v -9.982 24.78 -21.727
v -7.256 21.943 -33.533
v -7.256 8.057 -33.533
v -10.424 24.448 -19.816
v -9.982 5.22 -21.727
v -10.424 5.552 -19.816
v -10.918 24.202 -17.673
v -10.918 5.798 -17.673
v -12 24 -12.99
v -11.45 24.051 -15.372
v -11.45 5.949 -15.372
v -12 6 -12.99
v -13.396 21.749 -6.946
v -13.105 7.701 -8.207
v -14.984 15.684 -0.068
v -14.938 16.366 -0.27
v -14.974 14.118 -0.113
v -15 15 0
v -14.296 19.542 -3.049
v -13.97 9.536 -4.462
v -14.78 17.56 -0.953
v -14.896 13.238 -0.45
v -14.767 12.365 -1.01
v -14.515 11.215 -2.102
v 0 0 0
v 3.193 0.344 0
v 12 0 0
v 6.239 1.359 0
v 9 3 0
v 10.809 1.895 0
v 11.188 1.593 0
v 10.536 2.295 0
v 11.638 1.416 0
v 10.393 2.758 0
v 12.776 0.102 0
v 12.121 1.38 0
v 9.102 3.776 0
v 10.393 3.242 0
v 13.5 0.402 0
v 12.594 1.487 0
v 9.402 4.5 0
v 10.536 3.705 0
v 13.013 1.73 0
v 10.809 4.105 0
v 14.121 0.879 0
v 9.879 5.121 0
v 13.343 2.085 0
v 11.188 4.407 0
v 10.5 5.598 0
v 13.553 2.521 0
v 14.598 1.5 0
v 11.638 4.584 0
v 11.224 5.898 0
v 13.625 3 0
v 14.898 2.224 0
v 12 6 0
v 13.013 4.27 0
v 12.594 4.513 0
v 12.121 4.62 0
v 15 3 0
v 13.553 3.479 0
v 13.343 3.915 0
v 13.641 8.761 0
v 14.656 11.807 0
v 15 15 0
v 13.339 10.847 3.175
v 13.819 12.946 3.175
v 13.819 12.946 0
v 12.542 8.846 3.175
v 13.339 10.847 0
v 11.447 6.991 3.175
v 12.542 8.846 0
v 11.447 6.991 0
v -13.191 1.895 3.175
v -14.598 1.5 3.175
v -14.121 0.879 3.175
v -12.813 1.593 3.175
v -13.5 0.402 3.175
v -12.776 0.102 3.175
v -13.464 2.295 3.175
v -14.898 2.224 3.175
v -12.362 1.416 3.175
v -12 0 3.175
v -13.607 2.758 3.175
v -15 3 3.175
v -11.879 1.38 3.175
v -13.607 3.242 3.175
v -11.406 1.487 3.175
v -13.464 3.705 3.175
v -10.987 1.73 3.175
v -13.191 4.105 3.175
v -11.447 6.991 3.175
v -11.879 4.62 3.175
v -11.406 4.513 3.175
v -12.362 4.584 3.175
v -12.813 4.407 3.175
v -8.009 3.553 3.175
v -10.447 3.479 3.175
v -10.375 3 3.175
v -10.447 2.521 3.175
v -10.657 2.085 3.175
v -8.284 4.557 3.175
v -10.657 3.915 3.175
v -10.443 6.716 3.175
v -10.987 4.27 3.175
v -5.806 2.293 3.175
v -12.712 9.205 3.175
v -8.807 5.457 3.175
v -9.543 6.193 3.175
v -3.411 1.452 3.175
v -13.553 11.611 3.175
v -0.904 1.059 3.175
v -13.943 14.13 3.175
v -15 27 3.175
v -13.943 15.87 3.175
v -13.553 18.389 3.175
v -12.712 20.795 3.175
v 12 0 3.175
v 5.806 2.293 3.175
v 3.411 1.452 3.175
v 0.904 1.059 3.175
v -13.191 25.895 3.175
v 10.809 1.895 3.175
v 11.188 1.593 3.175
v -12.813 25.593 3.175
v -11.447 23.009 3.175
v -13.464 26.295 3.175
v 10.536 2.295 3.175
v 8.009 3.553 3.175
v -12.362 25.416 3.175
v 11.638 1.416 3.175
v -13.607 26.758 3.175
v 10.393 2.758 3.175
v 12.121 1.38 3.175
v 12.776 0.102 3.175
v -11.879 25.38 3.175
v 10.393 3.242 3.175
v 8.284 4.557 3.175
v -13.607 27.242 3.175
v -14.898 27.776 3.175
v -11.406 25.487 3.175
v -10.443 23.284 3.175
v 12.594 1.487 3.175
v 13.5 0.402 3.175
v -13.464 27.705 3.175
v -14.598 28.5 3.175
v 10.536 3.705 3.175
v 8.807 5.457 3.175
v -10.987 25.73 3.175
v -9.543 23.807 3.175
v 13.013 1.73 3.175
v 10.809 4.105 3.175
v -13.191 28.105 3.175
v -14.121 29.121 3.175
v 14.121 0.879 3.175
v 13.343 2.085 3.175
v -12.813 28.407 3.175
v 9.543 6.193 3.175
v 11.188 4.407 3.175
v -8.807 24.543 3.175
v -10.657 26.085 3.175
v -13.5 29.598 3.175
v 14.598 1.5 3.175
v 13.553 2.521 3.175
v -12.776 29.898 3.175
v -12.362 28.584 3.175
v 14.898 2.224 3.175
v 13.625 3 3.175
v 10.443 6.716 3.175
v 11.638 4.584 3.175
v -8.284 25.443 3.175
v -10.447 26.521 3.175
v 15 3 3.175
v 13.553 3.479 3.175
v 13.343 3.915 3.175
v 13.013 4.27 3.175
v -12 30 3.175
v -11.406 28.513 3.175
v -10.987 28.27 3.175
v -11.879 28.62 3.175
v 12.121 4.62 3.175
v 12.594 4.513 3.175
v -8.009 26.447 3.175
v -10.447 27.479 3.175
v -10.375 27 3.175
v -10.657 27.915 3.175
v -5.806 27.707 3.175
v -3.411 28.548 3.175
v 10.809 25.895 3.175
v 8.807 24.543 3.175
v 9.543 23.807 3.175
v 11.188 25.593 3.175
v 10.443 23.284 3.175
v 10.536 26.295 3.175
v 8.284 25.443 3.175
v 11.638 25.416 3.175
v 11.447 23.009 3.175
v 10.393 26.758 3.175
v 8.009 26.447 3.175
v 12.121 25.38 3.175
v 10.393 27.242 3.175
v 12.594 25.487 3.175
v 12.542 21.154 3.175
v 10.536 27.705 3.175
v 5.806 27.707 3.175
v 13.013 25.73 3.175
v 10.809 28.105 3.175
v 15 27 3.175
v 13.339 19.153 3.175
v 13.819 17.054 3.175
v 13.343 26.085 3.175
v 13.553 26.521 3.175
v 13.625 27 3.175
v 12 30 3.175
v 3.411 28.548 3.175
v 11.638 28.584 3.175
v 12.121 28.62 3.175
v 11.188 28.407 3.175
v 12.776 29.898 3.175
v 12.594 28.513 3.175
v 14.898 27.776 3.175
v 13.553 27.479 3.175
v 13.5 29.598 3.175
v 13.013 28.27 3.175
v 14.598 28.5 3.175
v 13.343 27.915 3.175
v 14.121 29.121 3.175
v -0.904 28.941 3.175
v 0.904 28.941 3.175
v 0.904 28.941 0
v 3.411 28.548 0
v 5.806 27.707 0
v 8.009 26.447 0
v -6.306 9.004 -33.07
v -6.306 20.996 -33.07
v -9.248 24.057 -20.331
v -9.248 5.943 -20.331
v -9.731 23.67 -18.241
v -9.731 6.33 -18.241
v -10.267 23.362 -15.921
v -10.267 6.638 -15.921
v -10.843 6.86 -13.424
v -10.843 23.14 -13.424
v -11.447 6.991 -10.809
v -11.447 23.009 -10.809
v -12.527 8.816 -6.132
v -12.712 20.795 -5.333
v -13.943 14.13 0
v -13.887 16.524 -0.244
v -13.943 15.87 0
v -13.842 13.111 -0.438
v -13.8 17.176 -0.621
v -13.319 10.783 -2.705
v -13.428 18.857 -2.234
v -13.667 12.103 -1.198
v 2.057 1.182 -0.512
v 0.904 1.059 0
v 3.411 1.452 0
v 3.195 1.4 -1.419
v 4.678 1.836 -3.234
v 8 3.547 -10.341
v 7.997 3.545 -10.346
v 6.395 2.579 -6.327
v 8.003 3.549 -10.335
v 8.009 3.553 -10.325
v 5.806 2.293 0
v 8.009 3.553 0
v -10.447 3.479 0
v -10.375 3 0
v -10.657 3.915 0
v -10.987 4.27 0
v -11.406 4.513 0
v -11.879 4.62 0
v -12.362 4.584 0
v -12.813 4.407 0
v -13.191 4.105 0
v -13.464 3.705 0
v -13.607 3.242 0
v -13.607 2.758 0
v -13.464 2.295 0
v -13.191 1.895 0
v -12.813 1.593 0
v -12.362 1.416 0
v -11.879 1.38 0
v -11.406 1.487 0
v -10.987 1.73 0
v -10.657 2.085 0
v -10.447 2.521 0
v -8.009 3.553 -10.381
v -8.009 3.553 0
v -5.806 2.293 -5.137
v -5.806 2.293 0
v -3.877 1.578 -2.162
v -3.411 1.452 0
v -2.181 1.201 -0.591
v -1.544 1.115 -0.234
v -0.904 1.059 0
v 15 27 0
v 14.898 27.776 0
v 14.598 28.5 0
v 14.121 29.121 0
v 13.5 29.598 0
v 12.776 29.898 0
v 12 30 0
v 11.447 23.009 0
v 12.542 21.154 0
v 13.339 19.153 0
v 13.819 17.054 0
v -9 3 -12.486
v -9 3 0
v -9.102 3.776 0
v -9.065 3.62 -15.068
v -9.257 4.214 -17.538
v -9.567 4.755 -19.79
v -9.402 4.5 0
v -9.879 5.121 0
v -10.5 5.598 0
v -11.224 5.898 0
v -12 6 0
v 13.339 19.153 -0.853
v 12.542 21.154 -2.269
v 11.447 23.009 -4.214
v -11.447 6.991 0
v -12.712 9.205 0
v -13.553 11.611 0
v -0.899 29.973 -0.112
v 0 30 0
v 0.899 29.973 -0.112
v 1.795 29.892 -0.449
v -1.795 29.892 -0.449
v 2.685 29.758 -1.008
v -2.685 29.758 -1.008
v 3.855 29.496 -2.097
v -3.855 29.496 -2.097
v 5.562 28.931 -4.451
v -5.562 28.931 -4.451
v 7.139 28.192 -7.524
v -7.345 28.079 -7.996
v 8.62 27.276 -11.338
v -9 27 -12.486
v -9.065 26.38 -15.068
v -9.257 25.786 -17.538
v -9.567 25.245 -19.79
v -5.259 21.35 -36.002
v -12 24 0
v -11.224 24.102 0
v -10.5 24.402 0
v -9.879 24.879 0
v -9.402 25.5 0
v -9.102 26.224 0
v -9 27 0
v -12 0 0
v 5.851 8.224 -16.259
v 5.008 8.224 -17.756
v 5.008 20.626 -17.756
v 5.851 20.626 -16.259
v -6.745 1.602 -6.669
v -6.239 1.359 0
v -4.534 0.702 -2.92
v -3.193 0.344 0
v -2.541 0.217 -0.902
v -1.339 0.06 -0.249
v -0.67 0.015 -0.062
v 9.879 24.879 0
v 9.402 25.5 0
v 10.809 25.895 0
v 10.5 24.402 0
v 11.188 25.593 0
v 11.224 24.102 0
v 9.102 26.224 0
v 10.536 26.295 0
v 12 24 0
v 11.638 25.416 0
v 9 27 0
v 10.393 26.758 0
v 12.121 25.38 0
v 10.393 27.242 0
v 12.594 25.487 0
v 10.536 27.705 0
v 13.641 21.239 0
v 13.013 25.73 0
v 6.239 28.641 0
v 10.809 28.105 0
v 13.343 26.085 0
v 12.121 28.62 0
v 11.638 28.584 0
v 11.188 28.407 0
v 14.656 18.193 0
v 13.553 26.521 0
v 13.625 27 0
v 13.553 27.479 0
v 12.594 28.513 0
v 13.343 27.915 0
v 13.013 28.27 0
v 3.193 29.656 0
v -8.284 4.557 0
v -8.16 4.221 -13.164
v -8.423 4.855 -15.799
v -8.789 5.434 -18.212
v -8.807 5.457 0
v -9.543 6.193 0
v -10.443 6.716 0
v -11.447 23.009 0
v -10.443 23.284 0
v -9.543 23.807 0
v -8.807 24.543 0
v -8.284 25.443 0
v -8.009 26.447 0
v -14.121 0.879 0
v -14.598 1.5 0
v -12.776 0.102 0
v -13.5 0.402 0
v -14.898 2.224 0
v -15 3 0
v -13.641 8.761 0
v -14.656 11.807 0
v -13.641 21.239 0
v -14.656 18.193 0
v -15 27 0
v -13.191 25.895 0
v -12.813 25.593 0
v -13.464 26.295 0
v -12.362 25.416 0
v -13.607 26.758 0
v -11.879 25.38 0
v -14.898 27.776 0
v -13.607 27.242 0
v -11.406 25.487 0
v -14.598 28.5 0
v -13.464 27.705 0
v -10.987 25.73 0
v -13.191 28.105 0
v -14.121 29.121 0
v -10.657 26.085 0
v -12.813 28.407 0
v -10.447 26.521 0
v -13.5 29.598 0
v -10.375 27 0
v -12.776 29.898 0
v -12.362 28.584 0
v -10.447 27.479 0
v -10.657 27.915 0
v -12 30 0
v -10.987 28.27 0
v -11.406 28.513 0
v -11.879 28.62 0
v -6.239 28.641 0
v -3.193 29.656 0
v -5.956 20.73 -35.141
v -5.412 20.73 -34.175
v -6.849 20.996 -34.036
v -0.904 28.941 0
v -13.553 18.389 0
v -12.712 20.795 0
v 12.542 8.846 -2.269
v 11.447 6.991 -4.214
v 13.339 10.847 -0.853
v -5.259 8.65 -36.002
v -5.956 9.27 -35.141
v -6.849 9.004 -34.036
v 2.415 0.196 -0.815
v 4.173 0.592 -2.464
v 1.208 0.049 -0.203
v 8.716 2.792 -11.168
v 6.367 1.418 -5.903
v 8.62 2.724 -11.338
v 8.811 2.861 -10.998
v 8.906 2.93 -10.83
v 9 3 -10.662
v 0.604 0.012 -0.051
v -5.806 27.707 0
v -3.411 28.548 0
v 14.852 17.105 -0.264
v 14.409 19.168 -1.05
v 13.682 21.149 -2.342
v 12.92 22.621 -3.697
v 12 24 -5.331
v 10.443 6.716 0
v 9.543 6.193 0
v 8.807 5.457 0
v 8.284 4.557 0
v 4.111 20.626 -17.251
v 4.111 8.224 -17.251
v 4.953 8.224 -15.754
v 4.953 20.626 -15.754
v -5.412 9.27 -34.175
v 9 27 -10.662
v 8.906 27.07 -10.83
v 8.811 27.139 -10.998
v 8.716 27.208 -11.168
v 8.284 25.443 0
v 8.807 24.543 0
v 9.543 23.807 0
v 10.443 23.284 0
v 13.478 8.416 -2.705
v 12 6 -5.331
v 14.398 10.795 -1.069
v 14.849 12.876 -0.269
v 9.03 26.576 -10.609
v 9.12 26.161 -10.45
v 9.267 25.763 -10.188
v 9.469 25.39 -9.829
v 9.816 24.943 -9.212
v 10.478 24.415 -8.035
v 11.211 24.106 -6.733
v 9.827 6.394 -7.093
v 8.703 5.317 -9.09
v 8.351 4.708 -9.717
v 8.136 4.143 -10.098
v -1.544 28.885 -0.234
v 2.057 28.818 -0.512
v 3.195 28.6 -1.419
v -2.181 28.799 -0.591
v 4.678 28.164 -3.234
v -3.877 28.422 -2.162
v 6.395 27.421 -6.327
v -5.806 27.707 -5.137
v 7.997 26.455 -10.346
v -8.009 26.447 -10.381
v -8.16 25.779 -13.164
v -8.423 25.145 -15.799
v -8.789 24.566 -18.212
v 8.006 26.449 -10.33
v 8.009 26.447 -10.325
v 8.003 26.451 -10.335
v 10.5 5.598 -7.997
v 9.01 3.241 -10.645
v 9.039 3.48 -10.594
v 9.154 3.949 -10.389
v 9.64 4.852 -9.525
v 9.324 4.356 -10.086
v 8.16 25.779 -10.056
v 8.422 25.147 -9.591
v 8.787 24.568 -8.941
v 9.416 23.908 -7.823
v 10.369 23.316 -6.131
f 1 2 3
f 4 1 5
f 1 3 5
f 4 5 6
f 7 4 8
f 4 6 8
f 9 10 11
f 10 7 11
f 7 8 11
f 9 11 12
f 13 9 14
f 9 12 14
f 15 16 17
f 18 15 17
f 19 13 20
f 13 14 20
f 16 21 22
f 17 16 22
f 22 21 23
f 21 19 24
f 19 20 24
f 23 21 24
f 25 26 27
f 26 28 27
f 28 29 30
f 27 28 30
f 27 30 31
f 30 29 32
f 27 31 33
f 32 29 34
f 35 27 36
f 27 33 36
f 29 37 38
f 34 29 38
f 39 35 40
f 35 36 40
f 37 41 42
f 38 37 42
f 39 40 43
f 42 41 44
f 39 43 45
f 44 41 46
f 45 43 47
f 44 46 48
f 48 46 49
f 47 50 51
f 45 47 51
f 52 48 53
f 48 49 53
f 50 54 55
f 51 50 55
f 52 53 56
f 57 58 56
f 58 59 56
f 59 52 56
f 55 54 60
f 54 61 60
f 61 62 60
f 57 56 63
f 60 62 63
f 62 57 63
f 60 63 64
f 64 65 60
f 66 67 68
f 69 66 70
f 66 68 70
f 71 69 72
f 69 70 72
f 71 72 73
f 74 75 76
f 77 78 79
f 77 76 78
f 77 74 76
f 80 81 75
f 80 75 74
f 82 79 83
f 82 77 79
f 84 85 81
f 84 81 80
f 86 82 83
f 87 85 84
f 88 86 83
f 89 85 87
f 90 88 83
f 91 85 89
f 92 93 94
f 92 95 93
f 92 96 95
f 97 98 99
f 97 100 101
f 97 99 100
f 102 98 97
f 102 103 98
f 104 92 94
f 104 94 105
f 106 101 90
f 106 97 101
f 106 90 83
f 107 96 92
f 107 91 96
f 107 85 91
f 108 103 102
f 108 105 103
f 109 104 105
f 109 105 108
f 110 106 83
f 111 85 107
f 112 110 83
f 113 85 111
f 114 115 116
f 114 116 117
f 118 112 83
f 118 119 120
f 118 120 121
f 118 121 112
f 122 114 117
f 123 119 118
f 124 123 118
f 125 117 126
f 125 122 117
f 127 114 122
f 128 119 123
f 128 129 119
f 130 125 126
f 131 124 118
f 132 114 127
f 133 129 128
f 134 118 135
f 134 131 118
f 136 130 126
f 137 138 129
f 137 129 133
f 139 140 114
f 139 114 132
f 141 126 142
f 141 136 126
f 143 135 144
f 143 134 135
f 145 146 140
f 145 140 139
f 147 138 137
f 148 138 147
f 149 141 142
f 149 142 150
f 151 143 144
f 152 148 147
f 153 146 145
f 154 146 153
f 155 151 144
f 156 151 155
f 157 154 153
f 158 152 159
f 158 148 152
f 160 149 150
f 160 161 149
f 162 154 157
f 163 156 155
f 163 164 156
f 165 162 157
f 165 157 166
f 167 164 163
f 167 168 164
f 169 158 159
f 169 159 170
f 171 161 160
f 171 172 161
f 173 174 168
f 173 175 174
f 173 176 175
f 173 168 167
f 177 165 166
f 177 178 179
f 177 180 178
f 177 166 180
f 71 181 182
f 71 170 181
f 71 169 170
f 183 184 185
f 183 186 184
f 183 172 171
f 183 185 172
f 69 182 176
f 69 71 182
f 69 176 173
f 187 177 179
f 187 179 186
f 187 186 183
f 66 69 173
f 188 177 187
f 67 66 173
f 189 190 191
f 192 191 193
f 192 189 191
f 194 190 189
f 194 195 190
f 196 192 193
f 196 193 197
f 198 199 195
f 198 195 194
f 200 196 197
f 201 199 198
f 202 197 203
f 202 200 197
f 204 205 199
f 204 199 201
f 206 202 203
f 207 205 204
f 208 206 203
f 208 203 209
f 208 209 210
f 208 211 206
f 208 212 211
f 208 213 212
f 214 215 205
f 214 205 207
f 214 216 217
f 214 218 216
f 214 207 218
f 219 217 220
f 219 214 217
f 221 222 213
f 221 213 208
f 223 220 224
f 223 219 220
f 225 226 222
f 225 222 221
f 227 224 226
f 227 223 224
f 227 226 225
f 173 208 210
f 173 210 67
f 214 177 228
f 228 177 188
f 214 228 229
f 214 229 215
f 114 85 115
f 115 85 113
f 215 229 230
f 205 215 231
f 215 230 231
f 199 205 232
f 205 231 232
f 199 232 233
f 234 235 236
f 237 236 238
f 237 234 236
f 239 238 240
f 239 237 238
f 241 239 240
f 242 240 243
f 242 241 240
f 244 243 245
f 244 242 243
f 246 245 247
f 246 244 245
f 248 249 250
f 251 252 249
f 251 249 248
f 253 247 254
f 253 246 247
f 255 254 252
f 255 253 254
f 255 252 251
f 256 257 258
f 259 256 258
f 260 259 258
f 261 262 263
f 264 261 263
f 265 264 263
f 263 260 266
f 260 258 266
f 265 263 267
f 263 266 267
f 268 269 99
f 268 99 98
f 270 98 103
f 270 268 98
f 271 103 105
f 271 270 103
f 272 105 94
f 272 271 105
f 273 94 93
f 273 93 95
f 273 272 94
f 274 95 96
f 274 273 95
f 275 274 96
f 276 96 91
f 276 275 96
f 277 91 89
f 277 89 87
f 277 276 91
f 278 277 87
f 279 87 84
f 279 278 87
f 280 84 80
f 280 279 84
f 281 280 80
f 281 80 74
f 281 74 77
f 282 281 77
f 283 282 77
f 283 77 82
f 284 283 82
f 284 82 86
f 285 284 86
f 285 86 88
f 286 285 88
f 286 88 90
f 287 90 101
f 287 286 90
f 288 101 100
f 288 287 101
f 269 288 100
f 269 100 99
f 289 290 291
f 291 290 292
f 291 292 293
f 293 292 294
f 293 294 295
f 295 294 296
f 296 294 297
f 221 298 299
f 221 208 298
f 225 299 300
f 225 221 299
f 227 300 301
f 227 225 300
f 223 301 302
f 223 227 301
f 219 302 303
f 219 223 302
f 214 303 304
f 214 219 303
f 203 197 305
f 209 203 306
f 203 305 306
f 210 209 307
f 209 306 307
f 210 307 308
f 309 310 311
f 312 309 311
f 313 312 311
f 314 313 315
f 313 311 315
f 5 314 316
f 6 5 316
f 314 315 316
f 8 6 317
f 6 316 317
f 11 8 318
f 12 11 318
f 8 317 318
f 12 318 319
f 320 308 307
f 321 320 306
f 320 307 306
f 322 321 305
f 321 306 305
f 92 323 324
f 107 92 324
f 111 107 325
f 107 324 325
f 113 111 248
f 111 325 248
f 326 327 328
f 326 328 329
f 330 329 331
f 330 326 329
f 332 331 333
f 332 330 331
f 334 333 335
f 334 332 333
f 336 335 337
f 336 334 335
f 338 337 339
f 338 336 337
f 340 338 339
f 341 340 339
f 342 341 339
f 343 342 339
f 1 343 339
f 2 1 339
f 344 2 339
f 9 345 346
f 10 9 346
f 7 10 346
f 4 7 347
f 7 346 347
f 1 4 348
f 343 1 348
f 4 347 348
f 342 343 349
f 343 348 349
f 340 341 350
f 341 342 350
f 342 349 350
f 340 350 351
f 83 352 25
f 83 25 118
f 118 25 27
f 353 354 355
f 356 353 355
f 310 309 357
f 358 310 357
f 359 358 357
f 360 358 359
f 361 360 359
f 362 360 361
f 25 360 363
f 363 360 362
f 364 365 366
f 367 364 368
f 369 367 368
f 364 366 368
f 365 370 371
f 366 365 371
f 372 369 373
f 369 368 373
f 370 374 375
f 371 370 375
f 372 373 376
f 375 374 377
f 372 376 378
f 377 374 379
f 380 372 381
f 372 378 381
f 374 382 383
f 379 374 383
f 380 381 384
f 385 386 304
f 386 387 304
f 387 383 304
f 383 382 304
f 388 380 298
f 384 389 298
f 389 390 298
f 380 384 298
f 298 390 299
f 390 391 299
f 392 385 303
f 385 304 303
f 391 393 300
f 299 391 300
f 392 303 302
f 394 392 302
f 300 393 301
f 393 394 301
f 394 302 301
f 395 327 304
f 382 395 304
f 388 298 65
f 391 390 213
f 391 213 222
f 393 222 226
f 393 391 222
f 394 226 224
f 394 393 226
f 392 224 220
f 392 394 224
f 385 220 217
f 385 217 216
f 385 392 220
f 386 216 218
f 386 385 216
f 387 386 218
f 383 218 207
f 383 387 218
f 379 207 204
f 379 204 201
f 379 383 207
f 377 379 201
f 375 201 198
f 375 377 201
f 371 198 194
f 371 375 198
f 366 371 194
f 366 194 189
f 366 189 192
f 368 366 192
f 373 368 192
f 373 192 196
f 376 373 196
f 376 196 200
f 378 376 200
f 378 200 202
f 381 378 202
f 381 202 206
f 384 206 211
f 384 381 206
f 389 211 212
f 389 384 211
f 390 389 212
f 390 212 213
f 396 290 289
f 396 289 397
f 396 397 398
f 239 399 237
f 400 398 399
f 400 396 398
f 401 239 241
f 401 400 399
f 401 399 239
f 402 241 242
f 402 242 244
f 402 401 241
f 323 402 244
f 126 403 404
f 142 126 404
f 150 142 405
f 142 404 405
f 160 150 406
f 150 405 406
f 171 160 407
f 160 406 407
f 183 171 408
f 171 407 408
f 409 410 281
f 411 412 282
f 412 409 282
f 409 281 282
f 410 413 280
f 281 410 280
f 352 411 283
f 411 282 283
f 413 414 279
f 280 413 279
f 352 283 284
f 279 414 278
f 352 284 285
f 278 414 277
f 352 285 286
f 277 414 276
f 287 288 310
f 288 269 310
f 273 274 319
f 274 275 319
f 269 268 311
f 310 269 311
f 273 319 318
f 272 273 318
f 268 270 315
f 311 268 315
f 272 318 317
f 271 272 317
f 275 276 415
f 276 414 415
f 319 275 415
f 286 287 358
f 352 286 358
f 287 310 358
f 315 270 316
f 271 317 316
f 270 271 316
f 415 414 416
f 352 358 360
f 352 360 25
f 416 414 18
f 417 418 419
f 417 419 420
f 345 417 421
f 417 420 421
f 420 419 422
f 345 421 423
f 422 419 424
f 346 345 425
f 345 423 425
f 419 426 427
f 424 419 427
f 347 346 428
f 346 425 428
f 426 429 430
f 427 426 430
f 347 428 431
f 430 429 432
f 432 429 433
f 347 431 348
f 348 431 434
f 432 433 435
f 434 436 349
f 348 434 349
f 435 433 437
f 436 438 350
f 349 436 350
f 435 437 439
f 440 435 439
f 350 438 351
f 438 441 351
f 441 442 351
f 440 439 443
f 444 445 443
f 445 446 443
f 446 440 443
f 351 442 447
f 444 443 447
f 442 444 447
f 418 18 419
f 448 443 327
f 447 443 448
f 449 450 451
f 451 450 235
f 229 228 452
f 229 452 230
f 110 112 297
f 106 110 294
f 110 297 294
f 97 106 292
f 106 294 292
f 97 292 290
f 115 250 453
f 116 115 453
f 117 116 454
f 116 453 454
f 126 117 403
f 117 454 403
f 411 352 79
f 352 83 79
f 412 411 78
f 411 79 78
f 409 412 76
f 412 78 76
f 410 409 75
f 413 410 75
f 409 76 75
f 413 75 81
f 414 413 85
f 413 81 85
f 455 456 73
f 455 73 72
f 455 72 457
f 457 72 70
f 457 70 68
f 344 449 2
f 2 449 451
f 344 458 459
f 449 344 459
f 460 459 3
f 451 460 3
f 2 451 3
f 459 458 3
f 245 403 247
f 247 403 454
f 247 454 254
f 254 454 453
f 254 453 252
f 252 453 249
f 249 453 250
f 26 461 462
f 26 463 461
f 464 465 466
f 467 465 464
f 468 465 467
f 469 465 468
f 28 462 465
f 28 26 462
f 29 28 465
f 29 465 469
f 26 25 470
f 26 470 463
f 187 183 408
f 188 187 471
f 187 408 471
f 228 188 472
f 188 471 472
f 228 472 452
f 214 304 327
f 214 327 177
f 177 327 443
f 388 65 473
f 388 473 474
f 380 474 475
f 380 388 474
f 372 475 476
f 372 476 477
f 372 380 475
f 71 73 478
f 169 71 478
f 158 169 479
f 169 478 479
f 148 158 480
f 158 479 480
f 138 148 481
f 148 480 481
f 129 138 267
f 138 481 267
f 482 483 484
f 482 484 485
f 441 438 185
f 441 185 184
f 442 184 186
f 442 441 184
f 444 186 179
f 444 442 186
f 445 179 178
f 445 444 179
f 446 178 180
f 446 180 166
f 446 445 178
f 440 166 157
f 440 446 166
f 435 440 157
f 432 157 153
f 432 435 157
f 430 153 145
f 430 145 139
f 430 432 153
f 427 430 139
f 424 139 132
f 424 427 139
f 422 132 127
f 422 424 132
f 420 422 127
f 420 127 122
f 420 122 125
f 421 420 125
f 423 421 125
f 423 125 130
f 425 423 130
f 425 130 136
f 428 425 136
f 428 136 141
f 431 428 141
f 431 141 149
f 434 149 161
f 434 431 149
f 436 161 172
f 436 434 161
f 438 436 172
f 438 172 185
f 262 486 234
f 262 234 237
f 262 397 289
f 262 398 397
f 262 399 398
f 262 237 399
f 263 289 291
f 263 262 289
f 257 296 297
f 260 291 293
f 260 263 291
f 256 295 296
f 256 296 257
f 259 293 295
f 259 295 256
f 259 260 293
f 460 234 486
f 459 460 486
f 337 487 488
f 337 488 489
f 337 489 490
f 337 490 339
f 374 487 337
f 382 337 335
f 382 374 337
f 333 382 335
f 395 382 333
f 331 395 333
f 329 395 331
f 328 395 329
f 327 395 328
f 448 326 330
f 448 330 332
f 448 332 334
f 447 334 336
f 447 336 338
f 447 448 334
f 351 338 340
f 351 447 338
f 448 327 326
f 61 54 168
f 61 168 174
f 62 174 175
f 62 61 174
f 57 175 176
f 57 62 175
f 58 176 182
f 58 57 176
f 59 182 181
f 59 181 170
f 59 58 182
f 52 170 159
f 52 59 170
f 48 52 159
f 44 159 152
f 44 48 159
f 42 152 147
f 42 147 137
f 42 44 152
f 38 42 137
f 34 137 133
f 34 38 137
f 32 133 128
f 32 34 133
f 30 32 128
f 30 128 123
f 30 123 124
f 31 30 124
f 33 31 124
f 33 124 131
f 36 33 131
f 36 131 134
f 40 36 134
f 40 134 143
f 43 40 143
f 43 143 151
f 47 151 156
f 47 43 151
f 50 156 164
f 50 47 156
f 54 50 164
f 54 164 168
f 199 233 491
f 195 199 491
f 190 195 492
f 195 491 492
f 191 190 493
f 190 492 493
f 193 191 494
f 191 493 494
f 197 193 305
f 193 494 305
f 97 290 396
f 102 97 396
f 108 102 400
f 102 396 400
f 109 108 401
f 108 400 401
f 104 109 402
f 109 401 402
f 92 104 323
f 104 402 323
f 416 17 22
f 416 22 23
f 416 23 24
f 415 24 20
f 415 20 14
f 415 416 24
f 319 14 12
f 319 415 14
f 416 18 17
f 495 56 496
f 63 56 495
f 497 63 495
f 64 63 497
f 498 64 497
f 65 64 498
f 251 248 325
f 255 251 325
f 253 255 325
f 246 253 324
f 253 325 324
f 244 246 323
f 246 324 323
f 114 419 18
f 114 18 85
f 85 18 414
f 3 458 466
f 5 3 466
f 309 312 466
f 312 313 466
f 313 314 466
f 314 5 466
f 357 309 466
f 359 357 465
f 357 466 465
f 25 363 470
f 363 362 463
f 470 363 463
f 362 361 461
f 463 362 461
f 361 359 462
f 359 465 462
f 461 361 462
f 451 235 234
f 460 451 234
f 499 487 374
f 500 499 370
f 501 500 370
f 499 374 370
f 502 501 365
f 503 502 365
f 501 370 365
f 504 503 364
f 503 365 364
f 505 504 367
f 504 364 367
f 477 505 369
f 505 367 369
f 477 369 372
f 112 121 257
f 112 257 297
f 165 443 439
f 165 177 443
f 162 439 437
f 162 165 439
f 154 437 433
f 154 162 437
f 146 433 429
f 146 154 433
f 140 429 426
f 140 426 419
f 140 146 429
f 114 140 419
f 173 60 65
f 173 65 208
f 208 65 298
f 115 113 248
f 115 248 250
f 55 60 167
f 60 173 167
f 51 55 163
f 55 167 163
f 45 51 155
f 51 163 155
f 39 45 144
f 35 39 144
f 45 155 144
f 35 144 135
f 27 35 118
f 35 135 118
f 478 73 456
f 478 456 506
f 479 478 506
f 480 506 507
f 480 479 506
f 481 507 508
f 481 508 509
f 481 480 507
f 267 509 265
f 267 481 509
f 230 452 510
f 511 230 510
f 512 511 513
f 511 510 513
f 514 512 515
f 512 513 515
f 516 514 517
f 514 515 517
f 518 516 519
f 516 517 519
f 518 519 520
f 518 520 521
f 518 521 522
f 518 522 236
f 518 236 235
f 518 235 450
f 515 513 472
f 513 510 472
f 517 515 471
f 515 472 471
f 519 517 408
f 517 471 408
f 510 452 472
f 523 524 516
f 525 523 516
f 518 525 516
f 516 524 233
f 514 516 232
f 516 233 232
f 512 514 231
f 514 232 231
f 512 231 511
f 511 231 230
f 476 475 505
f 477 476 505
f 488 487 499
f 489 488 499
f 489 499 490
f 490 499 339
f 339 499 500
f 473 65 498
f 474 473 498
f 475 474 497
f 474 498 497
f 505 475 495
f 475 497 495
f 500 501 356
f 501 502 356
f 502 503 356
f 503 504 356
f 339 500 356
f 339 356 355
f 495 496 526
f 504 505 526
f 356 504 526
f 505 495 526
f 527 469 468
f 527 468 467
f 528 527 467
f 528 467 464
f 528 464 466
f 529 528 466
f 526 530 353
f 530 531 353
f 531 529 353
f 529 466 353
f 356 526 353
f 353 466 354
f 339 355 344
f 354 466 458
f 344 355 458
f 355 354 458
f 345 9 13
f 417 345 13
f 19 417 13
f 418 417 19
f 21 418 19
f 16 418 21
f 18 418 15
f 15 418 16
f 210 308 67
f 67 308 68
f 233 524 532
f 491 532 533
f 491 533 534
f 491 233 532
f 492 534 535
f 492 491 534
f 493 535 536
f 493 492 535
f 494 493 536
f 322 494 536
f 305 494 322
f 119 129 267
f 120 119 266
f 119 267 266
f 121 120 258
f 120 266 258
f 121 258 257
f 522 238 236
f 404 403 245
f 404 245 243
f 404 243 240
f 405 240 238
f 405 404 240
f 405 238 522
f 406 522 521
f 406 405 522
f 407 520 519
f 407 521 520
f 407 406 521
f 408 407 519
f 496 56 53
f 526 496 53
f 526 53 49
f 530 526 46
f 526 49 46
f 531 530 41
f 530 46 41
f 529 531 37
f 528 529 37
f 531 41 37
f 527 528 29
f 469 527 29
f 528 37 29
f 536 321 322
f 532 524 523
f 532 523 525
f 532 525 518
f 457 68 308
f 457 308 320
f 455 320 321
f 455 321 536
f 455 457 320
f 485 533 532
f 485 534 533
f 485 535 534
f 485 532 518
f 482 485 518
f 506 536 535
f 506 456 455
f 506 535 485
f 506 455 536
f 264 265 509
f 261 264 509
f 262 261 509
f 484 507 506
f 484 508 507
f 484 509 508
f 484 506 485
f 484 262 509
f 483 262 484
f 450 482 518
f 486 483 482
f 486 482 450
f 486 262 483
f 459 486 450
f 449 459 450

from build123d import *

# Parameters (mm, degrees)
F0_R          = 15
F1_DEPTH      = 50.8
F3_DEPTH      = 50.8
F5_DEPTH      = 16
F5_DEPTH_BACK = 25.4
F6_R          = 2.999994
F7_DEPTH      = 75
F8_T          = -1.0294366
F9_R          = 1.625
F10_DEPTH     = 3.175
F11_R         = 2.999994
F12_W         = 12.402147986
F12_H         = 1.7178952694
F13_DEPTH     = 1.0294366
F15_REACH     = 37.7778044783
F16_DEPTH     = 1.7178952694


# Not quite as in the source:
# - an extrude ends at something that could not be found from the text; its depth is read off the source's solid


with BuildPart() as f1:
    # F0 (on Top) → F1 (new body)
    with BuildSketch(Plane.XY):
        with Locations((0, 15)):
            Circle(F0_R)
    extrude(amount=-F1_DEPTH)

    # F2 (on Front) → F3 (cut)
    with BuildSketch(Plane.XZ):
        Polygon((-15, 0), (-15, -50.8), (15, -50.8), (15, 0), (-5.2591228073, -36.0019072397), (-7.2556595325, -33.5332099912), align=None)
    extrude(amount=-F3_DEPTH, mode=Mode.SUBTRACT)

    # F4 (on Right) → F5 (cut, two sides)
    with BuildSketch(Plane.YZ) as f5_sk:
        Polygon((30, -36.0019072397), (30, 0), (21.35, -36.0019072397), align=None)
        Polygon((8.65, -36.0019072397), (0, 0), (0, -36.0019072397), align=None)
    extrude(amount=-F5_DEPTH, mode=Mode.SUBTRACT)
    extrude(f5_sk.sketch, amount=F5_DEPTH_BACK, mode=Mode.SUBTRACT)

    # F6 (on face) → F7 (cut, through all)
    with BuildSketch(Plane.XY):
        with Locations((12.000006, 27.000006)):
            Circle(F6_R)
        with Locations((12.000006, 2.999994)):
            Circle(F6_R)
        with Locations((-12.000006, 2.999994)):
            Circle(F6_R)
        with Locations((-12.000006, 27.000006)):
            Circle(F6_R)
    extrude(amount=-F7_DEPTH, mode=Mode.SUBTRACT)

    # F8
    f8_openings = [f1.faces().sort_by_distance(p)[0] for p in [
        (0, 15, 0),
    ]]
    offset(amount=F8_T, openings=f8_openings)

    # F9 (on face) → F10 (join)
    with BuildSketch(Plane.XY):
        with BuildLine():
            Line((1.23e-08, 0), (15, 0))
            Line((15, 0), (15, 15))
            ThreePointArc((15, 15), (14.230247099, 10.2565763946), (11.999991, 5.999988))
            ThreePointArc((11.999991, 5.999988), (9.8786898991, 5.1213101009), (9.000012, 3.000009))
            ThreePointArc((9.000012, 3.000009), (4.7434236112, 0.7697529029), (1.23e-08, 0))
        make_face()
        with Locations((12.000006, 2.999994)):
            Circle(F9_R, mode=Mode.SUBTRACT)
        with BuildLine():
            Line((-15, 0), (1.23e-08, 0))
            ThreePointArc((1.23e-08, 0), (-4.7434235996, 0.769752899), (-9.000012, 3.000009))
            ThreePointArc((-9.000012, 3.000009), (-9.8786898991, 5.1213101009), (-11.999991, 5.999988))
            ThreePointArc((-11.999991, 5.999988), (-14.230247099, 10.2565763946), (-15, 15))
            Line((-15, 15), (-15, 0))
        make_face()
        with Locations((-12.000006, 2.999994)):
            Circle(F9_R, mode=Mode.SUBTRACT)
        with BuildLine():
            ThreePointArc((-9.000012, 3.000009), (-4.7434235996, 0.769752899), (1.23e-08, 0))
            ThreePointArc((1.23e-08, 0), (4.7434236112, 0.7697529029), (9.000012, 3.000009))
            ThreePointArc((9.000012, 3.000009), (9.8786898991, 5.1213101009), (11.999991, 5.999988))
            ThreePointArc((11.999991, 5.999988), (14.230247099, 10.2565763946), (15, 15))
            ThreePointArc((15, 15), (14.230247099, 19.7434236054), (11.999991, 24.000012))
            ThreePointArc((11.999991, 24.000012), (9.8786898991, 24.8786898991), (9.000012, 26.999991))
            ThreePointArc((9.000012, 26.999991), (4.7434236018, 29.2302471002), (-7.6e-09, 30))
            ThreePointArc((-7.6e-09, 30), (-4.743423609, 29.2302470978), (-9.000012, 26.999991))
            ThreePointArc((-9.000012, 26.999991), (-9.8786898991, 24.8786898991), (-11.999991, 24.000012))
            ThreePointArc((-11.999991, 24.000012), (-14.230247099, 19.7434236054), (-15, 15))
            ThreePointArc((-15, 15), (-14.230247099, 10.2565763946), (-11.999991, 5.999988))
            ThreePointArc((-11.999991, 5.999988), (-9.8786898991, 5.1213101009), (-9.000012, 3.000009))
        make_face()
        with BuildLine():
            Line((0.9042769799, 1.0587330254), (-0.9042769799, 1.0587330254))
            ThreePointArc((-0.9042769799, 1.0587330254), (-4.6276702262, 1.8181446681), (-8.0086800871, 3.5528307003))
            ThreePointArc((-8.0086800871, 3.5528307003), (-9.1507682984, 5.8492317016), (-11.4471692997, 6.9913199129))
            ThreePointArc((-11.4471692997, 6.9913199129), (-13.1875845683, 10.3886818623), (-13.9434671073, 14.1303065241))
            Line((-13.9434671073, 14.1303065241), (-13.9434671073, 15.8696934759))
            ThreePointArc((-13.9434671073, 15.8696934759), (-13.1875845683, 19.6113181377), (-11.4471692997, 23.0086800871))
            ThreePointArc((-11.4471692997, 23.0086800871), (-9.1507682984, 24.1507682984), (-8.0086800871, 26.4471692997))
            ThreePointArc((-8.0086800871, 26.4471692997), (-4.6276702262, 28.1818553319), (-0.9042769799, 28.9412669746))
            Line((-0.9042769799, 28.9412669746), (0.9042769799, 28.9412669746))
            ThreePointArc((0.9042769799, 28.9412669746), (4.6276702262, 28.1818553319), (8.0086800871, 26.4471692997))
            ThreePointArc((8.0086800871, 26.4471692997), (9.1507682984, 24.1507682984), (11.4471692997, 23.0086800871))
            ThreePointArc((11.4471692997, 23.0086800871), (12.9790918545, 20.1691214289), (13.8187656408, 17.053864133))
            Line((13.8187656408, 17.053864133), (13.8187656408, 12.946135867))
            ThreePointArc((13.8187656408, 12.946135867), (12.9790918545, 9.8308785711), (11.4471692997, 6.9913199129))
            ThreePointArc((11.4471692997, 6.9913199129), (9.1507682984, 5.8492317016), (8.0086800871, 3.5528307003))
            ThreePointArc((8.0086800871, 3.5528307003), (4.6276702262, 1.8181446681), (0.9042769799, 1.0587330254))
        make_face(mode=Mode.SUBTRACT)
        with BuildLine():
            ThreePointArc((11.999991, 24.000012), (14.230247099, 19.7434236054), (15, 15))
            Line((15, 15), (15, 30))
            Line((15, 30), (-7.6e-09, 30))
            ThreePointArc((-7.6e-09, 30), (4.7434236018, 29.2302471002), (9.000012, 26.999991))
            ThreePointArc((9.000012, 26.999991), (9.8786898991, 24.8786898991), (11.999991, 24.000012))
        make_face()
        with Locations((12.000006, 27.000006)):
            Circle(F9_R, mode=Mode.SUBTRACT)
        with BuildLine():
            Line((-15, 30), (-15, 15))
            ThreePointArc((-15, 15), (-14.230247099, 19.7434236054), (-11.999991, 24.000012))
            ThreePointArc((-11.999991, 24.000012), (-9.8786898991, 24.8786898991), (-9.000012, 26.999991))
            ThreePointArc((-9.000012, 26.999991), (-4.743423609, 29.2302470978), (-7.6e-09, 30))
            Line((-7.6e-09, 30), (-15, 30))
        make_face()
        with Locations((-12.000006, 27.000006)):
            Circle(F9_R, mode=Mode.SUBTRACT)
    extrude(amount=F10_DEPTH)

    # F11
    f11_edges = [f1.edges().sort_by_distance(p)[0] for p in [
        (15, 0, 1.5875),
        (-15, 0, 1.5875),
        (-15, 30, 1.5875),
        (15, 30, 1.5875),
    ]]
    fillet(f11_edges, radius=F11_R)

    # F12 (on face) → F13 (cut, through all)
    with BuildSketch(Plane(origin=(11.3924813609, 0, -6.4108181112), x_dir=(0, 1, 0), z_dir=(0.8714922589, 0, -0.4904092603))):
        with Locations((14.4248786382, -12.1594956145)):
            Rectangle(F12_W, F12_H)
    extrude(amount=-F13_DEPTH, mode=Mode.SUBTRACT)

    f15_end = f1.faces().sort_by_distance((-6.2722387902, 15, -34.7491996848))[0]
    # F14 (on face) → F15 (cut, up to a face of the model that its end follows)
    with BuildSketch(Plane(origin=(-6.3843651243, 0, -11.3454725151), x_dir=(0.8714922589, 0, -0.4904092603), z_dir=(0.4904092603, 0, 0.8714922589))):
        Polygon((12.0429472841, 9.2698510415), (12.0429472841, 20.7301489585), (10.7223677877, 20.9956137981), (10.7223677877, 9.0043862019), align=None)
    f15_long = extrude(amount=-F15_REACH, mode=Mode.PRIVATE)
    add(split(f15_long, bisect_by=f15_end, keep=Keep.BOTTOM, mode=Mode.PRIVATE), mode=Mode.SUBTRACT)

    # F16 (add, through all): a face of the model
    f16_faces = [f1.faces().sort_by_distance(p)[0] for p in [
        (4.5595432226, 14.4248786382, -17.5038680055),
    ]]
    extrude(f16_faces, amount=F16_DEPTH)


solid = f1.part
